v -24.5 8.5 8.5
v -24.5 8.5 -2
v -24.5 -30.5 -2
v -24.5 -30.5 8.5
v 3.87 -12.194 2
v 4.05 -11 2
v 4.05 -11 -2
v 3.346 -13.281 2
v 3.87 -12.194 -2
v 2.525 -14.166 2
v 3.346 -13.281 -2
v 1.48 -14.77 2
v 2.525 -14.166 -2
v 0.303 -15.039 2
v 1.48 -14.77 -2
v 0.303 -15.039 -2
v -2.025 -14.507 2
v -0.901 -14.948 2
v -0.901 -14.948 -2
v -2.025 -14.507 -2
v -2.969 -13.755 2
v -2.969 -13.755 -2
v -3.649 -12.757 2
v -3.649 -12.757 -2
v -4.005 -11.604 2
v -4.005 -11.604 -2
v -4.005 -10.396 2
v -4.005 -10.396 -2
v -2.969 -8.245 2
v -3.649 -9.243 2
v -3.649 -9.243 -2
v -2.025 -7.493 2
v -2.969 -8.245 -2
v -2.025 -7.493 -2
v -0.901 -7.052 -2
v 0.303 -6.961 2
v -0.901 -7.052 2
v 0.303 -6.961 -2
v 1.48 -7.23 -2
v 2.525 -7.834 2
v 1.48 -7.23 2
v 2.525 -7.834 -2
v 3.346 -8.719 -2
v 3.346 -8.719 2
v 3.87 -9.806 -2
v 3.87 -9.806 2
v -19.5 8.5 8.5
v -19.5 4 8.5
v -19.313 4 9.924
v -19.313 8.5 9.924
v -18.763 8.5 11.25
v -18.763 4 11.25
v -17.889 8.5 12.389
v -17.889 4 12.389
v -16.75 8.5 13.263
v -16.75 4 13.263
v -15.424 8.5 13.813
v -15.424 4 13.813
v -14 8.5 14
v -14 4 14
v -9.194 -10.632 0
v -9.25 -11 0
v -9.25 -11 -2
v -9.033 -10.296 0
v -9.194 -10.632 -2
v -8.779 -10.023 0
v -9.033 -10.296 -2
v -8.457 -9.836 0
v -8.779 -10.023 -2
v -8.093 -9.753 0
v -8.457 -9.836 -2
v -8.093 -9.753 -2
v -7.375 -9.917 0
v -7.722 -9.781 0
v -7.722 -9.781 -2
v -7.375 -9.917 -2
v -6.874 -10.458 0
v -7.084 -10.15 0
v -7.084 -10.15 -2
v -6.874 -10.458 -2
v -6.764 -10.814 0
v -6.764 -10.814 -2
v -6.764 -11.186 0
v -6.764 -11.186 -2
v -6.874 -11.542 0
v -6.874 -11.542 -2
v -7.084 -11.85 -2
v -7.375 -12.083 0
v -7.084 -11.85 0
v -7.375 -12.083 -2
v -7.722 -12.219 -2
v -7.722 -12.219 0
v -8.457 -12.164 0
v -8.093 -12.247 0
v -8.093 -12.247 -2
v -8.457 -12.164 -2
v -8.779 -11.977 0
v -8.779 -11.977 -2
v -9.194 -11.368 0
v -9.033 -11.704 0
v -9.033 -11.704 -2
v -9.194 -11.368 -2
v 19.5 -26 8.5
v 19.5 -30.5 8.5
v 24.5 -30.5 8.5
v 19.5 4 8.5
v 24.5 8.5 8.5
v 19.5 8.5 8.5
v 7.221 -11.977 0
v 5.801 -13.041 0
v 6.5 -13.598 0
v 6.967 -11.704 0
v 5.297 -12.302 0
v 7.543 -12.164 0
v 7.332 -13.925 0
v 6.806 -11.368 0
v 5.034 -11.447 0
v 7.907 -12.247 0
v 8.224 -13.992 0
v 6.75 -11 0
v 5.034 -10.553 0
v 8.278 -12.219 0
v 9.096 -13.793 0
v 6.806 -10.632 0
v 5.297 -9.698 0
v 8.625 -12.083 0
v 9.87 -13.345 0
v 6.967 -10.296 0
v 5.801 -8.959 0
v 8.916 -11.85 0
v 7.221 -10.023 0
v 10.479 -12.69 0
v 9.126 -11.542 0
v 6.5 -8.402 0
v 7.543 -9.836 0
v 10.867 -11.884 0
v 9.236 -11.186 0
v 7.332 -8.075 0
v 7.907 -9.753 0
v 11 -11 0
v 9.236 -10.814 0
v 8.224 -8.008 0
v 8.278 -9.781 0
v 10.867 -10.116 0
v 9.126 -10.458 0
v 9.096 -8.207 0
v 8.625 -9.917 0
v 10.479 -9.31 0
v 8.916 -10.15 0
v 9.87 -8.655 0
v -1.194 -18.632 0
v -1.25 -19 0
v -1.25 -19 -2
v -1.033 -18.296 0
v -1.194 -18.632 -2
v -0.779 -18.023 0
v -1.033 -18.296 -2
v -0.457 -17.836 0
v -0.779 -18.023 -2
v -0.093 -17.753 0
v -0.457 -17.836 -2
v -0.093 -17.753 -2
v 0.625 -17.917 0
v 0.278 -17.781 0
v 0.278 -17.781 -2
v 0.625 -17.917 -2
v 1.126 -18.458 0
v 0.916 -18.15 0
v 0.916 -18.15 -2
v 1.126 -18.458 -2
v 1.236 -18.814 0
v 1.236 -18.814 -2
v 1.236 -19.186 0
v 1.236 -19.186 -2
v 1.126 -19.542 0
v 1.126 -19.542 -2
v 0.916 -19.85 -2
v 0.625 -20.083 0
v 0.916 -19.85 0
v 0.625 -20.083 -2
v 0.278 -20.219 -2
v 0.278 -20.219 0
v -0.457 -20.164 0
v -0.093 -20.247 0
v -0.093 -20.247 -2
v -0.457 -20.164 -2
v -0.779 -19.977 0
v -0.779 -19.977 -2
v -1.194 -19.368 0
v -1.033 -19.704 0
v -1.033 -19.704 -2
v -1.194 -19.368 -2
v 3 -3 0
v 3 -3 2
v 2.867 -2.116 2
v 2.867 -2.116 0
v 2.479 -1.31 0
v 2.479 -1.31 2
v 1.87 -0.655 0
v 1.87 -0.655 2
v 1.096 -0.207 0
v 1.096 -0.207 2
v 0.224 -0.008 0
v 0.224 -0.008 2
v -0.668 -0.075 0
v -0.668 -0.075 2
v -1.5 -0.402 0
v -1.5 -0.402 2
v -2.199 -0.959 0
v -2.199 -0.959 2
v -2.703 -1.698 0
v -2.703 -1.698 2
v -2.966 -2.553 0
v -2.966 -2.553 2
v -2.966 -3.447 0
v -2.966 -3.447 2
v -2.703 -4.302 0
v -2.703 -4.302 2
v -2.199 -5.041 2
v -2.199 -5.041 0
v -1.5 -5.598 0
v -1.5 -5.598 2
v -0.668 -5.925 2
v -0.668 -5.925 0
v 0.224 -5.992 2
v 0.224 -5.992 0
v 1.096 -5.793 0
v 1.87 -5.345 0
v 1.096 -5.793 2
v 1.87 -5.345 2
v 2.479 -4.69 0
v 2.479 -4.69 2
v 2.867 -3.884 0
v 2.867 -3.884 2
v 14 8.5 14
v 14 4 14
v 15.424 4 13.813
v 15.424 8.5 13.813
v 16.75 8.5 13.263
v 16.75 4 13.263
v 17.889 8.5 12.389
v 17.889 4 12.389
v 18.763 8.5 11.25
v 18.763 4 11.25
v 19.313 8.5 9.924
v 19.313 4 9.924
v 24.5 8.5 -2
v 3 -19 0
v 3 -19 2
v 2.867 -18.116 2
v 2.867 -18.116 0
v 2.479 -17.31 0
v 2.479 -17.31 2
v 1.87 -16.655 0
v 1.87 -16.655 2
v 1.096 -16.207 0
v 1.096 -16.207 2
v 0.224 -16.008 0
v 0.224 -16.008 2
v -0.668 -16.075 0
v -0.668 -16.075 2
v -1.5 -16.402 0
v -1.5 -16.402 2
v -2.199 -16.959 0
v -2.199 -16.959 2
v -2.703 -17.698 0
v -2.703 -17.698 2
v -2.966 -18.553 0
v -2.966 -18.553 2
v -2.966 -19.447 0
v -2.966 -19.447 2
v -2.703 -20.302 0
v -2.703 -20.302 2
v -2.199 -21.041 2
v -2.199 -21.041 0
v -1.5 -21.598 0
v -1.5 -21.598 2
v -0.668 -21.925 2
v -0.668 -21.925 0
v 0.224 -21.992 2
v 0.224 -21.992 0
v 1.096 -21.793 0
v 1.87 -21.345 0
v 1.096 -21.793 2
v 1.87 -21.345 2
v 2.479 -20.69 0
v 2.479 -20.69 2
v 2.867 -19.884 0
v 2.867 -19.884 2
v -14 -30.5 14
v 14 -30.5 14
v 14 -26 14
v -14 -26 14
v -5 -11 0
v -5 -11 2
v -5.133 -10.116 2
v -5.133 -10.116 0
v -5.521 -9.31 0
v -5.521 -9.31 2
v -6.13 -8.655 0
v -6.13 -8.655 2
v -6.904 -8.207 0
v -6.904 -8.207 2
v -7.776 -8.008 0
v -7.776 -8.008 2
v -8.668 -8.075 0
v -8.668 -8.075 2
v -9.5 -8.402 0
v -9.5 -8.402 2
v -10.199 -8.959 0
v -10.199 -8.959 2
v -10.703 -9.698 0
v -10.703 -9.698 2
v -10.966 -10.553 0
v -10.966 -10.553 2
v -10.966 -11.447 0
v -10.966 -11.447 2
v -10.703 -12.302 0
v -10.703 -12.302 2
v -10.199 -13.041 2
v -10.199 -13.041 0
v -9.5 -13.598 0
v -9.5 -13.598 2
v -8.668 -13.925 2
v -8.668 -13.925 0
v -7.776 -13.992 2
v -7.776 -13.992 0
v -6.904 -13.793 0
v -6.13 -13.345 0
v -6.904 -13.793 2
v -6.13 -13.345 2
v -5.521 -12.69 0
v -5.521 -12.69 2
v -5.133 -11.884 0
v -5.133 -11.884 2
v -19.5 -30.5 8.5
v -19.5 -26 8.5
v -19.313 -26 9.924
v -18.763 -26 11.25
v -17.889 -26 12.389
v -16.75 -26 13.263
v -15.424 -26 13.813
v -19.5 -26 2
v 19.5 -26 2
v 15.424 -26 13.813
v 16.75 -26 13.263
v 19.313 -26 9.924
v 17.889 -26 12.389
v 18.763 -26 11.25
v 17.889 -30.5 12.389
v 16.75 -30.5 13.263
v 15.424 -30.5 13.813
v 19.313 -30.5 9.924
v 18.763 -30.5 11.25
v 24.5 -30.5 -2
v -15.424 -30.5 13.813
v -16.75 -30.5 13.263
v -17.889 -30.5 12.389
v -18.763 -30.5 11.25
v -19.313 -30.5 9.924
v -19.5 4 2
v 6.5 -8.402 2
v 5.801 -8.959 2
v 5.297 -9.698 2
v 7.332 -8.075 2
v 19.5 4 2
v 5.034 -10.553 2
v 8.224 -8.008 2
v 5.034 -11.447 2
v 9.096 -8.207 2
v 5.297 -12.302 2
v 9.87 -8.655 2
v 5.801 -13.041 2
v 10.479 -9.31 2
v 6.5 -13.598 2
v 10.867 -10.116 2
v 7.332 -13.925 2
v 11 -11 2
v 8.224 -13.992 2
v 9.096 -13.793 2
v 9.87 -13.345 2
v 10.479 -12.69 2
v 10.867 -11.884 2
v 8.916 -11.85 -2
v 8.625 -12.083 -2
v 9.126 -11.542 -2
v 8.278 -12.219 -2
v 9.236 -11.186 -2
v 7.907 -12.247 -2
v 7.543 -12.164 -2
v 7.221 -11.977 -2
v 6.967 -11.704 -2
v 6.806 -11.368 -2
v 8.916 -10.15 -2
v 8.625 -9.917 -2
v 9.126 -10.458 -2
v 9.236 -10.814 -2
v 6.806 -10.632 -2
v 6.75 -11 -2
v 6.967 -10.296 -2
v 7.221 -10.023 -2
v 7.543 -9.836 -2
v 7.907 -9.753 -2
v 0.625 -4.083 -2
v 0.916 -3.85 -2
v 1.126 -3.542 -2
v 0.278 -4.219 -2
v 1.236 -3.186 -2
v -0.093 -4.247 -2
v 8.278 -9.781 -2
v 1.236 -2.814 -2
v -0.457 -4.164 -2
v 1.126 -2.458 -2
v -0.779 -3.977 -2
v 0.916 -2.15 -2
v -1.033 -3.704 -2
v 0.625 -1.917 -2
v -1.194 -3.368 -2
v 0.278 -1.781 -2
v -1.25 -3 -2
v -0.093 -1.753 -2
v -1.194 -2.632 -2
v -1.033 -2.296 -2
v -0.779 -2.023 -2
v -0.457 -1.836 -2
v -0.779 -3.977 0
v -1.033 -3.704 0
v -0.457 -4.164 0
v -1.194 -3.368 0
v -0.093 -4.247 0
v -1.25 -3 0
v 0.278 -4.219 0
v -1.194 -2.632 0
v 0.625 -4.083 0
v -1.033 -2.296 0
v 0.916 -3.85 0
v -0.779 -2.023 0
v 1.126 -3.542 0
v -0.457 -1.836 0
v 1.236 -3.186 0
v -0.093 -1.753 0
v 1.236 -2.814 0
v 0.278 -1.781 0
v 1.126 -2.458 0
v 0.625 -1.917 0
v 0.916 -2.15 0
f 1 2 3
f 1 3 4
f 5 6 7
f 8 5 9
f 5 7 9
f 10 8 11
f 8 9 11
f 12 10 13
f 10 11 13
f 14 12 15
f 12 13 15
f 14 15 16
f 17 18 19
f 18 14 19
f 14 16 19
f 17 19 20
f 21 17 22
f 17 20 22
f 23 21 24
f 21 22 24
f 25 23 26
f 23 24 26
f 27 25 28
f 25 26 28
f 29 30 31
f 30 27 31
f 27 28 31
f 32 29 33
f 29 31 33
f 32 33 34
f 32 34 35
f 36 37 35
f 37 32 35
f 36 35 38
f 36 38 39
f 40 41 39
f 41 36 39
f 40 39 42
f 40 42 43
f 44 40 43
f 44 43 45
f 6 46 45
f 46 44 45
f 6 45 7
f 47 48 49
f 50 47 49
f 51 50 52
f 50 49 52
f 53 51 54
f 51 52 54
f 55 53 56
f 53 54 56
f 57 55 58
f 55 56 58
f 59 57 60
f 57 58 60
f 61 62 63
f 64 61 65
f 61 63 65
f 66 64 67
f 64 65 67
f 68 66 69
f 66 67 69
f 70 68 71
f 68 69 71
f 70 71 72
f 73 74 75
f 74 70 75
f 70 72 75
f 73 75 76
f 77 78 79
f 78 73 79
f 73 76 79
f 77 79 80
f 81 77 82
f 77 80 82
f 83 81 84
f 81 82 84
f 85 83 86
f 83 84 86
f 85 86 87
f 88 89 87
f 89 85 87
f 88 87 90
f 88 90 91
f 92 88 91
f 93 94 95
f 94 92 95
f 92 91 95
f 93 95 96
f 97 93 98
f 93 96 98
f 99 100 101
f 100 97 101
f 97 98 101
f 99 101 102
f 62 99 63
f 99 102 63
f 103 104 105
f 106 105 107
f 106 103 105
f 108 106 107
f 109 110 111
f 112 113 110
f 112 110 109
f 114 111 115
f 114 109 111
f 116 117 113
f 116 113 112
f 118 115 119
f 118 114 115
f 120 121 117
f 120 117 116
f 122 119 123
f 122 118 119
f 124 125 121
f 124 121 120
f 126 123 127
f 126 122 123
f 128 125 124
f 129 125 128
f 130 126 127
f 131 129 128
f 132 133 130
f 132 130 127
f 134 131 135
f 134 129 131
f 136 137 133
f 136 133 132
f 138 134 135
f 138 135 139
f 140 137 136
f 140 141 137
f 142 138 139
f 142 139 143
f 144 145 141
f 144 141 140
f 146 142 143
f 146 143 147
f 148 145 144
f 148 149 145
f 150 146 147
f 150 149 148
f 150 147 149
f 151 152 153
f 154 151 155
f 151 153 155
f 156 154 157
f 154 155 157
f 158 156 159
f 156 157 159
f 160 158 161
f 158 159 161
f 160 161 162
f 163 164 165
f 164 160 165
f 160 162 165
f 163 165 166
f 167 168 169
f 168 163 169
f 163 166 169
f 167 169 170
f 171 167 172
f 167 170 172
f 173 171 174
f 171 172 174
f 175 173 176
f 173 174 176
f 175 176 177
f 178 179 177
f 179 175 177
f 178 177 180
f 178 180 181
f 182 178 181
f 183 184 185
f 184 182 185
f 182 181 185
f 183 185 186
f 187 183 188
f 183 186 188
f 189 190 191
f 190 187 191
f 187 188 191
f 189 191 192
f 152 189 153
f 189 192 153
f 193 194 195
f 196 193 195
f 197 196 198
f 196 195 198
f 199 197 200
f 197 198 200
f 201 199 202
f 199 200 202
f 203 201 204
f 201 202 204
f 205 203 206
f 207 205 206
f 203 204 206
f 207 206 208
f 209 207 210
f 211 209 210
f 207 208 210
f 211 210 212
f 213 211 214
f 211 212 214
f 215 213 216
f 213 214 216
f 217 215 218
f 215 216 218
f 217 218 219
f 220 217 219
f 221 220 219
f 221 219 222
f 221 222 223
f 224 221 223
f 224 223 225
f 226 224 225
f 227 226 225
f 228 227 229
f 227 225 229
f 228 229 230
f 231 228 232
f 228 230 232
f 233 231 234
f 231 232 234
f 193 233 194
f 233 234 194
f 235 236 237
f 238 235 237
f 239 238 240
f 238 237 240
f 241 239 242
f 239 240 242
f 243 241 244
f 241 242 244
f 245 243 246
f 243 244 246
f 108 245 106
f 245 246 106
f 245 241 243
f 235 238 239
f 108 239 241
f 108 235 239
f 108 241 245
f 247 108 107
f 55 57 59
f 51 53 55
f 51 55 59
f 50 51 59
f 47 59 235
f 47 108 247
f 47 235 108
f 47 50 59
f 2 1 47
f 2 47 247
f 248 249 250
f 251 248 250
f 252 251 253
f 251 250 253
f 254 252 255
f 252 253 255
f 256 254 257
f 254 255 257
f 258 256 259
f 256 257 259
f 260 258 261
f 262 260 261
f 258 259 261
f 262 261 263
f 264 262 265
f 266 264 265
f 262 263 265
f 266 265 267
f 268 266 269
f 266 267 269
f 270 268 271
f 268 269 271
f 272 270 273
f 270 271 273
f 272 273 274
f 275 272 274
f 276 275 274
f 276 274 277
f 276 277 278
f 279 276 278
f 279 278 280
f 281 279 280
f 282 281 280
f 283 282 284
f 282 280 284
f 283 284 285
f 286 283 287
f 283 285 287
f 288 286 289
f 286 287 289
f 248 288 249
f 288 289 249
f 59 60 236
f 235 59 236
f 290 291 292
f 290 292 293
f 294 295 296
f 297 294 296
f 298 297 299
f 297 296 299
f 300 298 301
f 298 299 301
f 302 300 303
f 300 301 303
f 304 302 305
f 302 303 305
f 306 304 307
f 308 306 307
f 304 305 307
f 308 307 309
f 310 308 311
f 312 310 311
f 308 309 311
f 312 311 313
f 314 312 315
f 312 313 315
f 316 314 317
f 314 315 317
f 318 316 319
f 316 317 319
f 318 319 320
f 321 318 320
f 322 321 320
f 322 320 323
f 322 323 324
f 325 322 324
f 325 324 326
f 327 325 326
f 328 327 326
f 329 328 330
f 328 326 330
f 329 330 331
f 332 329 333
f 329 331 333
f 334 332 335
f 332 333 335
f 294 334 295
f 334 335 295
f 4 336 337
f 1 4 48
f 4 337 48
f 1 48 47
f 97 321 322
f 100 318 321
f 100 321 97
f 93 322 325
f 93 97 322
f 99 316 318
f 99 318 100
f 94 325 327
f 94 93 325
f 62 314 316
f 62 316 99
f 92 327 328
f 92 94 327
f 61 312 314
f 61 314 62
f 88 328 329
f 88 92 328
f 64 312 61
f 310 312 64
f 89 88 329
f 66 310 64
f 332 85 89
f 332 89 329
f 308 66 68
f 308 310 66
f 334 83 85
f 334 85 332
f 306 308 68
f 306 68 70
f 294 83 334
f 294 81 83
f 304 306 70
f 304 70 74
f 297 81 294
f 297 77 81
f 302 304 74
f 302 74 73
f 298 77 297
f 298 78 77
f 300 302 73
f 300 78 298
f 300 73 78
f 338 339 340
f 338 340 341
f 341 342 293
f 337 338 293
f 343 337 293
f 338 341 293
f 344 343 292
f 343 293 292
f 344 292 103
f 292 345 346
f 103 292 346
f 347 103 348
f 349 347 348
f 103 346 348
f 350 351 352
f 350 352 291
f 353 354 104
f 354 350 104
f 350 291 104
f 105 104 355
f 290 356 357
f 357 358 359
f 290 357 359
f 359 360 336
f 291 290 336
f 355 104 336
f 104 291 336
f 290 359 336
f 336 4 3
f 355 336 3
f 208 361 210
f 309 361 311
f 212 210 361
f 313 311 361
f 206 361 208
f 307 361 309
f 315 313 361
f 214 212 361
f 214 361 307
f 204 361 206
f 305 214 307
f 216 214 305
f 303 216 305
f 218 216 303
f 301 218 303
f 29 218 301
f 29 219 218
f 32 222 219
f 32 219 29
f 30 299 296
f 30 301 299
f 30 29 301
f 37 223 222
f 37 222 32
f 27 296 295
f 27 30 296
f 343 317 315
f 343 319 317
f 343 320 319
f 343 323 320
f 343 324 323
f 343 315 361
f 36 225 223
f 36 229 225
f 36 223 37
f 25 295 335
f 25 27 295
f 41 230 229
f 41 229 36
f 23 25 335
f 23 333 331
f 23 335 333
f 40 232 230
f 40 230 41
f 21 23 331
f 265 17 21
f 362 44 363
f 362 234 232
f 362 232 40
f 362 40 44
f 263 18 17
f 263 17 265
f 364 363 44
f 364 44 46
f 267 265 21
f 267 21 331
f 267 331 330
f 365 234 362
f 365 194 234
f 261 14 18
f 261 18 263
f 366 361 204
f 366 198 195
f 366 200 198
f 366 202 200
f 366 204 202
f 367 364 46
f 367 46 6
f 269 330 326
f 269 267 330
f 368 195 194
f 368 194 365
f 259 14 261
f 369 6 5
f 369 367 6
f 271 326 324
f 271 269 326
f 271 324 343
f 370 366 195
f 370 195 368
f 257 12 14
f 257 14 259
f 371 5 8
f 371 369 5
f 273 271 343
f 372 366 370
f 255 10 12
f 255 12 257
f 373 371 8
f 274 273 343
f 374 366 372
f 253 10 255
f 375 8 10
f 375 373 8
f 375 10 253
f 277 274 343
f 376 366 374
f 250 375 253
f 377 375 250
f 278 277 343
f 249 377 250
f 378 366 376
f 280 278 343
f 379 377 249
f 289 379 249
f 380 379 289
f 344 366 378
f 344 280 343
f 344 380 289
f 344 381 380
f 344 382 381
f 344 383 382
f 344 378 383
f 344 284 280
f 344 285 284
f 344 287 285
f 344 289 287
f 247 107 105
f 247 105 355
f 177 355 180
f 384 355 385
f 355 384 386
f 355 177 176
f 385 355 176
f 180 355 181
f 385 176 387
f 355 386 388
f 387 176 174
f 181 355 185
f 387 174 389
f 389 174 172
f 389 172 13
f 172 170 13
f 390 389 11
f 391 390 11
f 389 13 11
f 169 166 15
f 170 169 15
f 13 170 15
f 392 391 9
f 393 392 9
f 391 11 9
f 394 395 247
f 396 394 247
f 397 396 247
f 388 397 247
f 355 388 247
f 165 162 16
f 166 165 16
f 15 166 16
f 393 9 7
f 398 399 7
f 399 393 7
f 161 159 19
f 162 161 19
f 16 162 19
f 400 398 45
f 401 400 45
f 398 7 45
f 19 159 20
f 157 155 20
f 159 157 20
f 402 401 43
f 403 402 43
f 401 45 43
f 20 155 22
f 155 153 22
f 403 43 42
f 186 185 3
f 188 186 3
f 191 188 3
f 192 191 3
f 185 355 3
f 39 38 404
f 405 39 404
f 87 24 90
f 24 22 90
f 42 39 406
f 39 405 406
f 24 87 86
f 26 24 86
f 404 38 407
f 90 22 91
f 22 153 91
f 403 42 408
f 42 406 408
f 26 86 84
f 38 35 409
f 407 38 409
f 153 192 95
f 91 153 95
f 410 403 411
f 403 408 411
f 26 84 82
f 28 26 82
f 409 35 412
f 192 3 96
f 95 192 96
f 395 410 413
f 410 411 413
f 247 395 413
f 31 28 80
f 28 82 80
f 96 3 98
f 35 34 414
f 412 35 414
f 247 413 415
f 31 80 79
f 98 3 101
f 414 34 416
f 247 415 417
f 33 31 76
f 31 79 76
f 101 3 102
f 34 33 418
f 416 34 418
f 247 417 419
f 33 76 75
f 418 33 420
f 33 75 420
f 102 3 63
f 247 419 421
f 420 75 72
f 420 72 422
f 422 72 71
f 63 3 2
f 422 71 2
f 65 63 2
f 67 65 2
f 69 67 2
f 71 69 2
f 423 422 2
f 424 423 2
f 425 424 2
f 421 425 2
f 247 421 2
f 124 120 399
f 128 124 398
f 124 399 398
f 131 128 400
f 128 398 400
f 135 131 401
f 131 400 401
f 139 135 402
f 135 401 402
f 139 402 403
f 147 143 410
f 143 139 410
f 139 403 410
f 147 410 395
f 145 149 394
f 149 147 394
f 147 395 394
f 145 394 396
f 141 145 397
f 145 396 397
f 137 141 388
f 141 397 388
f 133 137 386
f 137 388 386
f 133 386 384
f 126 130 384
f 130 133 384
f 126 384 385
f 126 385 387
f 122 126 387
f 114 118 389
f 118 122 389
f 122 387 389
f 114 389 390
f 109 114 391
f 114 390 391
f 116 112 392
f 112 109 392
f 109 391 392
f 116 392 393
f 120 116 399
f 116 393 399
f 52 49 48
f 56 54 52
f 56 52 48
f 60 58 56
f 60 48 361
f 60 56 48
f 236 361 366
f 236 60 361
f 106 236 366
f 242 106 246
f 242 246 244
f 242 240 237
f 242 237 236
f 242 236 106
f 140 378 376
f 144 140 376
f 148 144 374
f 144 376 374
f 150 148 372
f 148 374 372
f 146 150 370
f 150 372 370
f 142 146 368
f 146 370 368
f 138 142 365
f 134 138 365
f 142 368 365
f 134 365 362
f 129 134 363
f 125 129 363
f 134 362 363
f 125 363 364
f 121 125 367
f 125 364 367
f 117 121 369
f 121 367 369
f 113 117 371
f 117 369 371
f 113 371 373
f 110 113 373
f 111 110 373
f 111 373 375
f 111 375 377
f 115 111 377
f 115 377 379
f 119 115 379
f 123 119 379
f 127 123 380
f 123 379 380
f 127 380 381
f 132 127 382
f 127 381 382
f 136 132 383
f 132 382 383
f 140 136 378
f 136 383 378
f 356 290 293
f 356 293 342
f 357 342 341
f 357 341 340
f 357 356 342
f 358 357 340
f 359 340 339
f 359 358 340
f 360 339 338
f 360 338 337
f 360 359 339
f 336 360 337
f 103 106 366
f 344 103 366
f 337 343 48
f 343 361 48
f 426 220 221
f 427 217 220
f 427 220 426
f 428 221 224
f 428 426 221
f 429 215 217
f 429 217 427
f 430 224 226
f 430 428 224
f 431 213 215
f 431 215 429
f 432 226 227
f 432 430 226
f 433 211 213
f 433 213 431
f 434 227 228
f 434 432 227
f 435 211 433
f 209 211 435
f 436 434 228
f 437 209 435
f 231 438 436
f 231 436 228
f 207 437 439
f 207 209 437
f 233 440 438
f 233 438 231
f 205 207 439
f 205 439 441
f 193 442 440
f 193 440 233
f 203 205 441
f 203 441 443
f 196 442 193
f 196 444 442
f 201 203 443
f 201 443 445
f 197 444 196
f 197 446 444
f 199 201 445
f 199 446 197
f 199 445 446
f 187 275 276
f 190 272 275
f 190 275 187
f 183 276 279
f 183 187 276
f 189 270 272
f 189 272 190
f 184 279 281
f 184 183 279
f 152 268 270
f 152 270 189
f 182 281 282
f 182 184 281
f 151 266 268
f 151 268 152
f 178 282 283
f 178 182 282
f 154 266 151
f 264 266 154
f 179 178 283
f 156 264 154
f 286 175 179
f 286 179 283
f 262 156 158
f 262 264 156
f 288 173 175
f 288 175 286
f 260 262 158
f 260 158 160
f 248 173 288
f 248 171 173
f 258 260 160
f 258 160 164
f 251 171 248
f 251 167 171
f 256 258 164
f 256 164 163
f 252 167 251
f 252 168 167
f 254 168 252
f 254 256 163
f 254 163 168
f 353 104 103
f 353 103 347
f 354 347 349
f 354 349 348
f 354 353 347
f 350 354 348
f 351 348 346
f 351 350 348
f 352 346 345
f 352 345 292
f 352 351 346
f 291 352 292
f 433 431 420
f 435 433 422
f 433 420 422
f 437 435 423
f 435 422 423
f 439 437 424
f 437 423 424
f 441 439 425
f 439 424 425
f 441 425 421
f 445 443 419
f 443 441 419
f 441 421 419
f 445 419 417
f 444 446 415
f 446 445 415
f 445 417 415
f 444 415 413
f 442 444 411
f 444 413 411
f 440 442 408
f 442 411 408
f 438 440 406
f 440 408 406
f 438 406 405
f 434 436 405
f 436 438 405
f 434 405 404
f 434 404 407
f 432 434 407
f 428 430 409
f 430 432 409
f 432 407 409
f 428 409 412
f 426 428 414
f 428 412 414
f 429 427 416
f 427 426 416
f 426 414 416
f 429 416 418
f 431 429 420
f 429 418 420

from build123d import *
from build123d.topology import SkipClean

# Parameters (mm, degrees)
SKETCH1_W            = 39
SKETCH1_H            = 23.712741858
BOSS_EXTRUDE1_DEPTH  = 2
SKETCH9_R            = 4.05
CUT_EXTRUDE6_DEPTH   = 5
SKETCH10_R           = 1.25
BOSS_EXTRUDE5_DEPTH  = 5.5
SKETCH11_R           = 2.5
CUT_EXTRUDE7_DEPTH   = 5
BOSS_EXTRUDE6_START  = -5.5
SKETCH12_R           = 2.5
BOSS_EXTRUDE6_DEPTH  = 5.5
BOSS_EXTRUDE7_DEPTH  = 28
BOSS_EXTRUDE8_START  = 2
SKETCH14_W           = 39
SKETCH14_H           = 29
SKETCH14_R           = 1.25
SKETCH14_R_2         = 4.05
BOSS_EXTRUDE8_DEPTH  = 2
SKETCH15_R           = 3
CUT_EXTRUDE8_DEPTH   = 2
BOSS_EXTRUDE9_DEPTH  = 5
BOSS_EXTRUDE10_START = 5
BOSS_EXTRUDE10_DEPTH = 5
CUT_EXTRUDE9_REACH   = 41.579
SKETCH18_W           = 39
SKETCH18_H           = 30
SKETCH19_W           = 10.5
SKETCH19_H           = 39
BOSS_EXTRUDE11_DEPTH = 5
SKETCH20_W           = 10.5
SKETCH20_H           = 39
BOSS_EXTRUDE12_DEPTH = 5


with BuildPart() as part:
    # Sketch1 → Boss-Extrude1 (new body)
    with BuildSketch(Plane.XY):
        with Locations((0, -11)):
            Rectangle(SKETCH1_W, SKETCH1_H)
        with BuildLine():
            ThreePointArc((1.25, -19), (0, -17.75), (-1.25, -19))
            ThreePointArc((-1.25, -19), (0, -20.25), (1.25, -19))
        make_face(mode=Mode.SUBTRACT)
        with BuildLine():
            ThreePointArc((-6.75, -11), (-8, -9.75), (-9.25, -11))
            ThreePointArc((-9.25, -11), (-8, -12.25), (-6.75, -11))
        make_face(mode=Mode.SUBTRACT)
        with BuildLine():
            ThreePointArc((1.25, -3), (0, -1.75), (-1.25, -3))
            ThreePointArc((-1.25, -3), (0, -4.25), (1.25, -3))
        make_face(mode=Mode.SUBTRACT)
        with BuildLine():
            ThreePointArc((9.25, -11), (8, -9.75), (6.75, -11))
            ThreePointArc((6.75, -11), (8, -12.25), (9.25, -11))
        make_face(mode=Mode.SUBTRACT)
    extrude(amount=BOSS_EXTRUDE1_DEPTH)

    # Sketch9 → Cut-Extrude6 (cut)
    with BuildSketch(Plane.XY.offset(2)):
        with Locations((0, -11)):
            Circle(SKETCH9_R)
    extrude(amount=-CUT_EXTRUDE6_DEPTH, mode=Mode.SUBTRACT)

    # Sketch10 → Boss-Extrude5 (add)
    # profile 1 of 2: a face of its own
    with BuildSketch(Plane.ZY.offset(19.5)):
        with BuildLine():
            Line((4.2, 3.5), (8.5, 3.5))
            Line((8.5, 3.5), (8.5, 0.5))
            ThreePointArc((8.5, 0.5), (7.474873734, -1.974873734), (5, -3))
            Line((5, -3), (2, -3))
            Line((2, -3), (2, 0.856370929))
            Line((2, 0.856370929), (0, 0.856370929))
            Line((0, 0.856370929), (0, 3.5))
            Line((0, 3.5), (4.2, 3.5))
        make_face()
        with Locations((5.25, 0.25)):
            Circle(SKETCH10_R, mode=Mode.SUBTRACT)
    # profile 2 of 2: a face of its own
    with BuildSketch(Plane.ZY.offset(19.5)):
        with BuildLine():
            Line((5, -19), (2, -19))
            Line((2, -19), (2, -22.856370929))
            Line((2, -22.856370929), (0, -22.856370929))
            Line((0, -22.856370929), (0, -25.5))
            Line((0, -25.5), (4.2, -25.5))
            Line((4.2, -25.5), (8.5, -25.5))
            Line((8.5, -25.5), (8.5, -22.5))
            ThreePointArc((8.5, -22.5), (7.474873734, -20.025126266), (5, -19))
        make_face()
        with Locations((5.25, -22.25)):
            Circle(SKETCH10_R, mode=Mode.SUBTRACT)
    extrude(amount=-BOSS_EXTRUDE5_DEPTH)

    # Sketch11 → Cut-Extrude7 (cut)
    with BuildSketch(Plane.ZY.offset(19.5)):
        with Locations((5.25, 0.25)):
            Circle(SKETCH11_R)
        with Locations(Location((5.25, -22.25, 0), (0, 0, 180))):
            Circle(SKETCH11_R)
    extrude(amount=-CUT_EXTRUDE7_DEPTH, mode=Mode.SUBTRACT)

    # Sketch12 → Boss-Extrude6 (add)
    with BuildSketch(Plane(origin=(19.5, 0, 0), x_dir=(0, 0, -1), z_dir=(1, 0, 0)).offset(BOSS_EXTRUDE6_START)):
        with BuildLine():
            ThreePointArc((-8.5, 0.5), (-7.474873734, -1.974873734), (-5, -3))
            Line((-5, -3), (-2, -3))
            Line((-2, -3), (-2, -19))
            Line((-2, -19), (-5, -19))
            ThreePointArc((-5, -19), (-7.474873734, -20.025126266), (-8.5, -22.5))
            Line((-8.5, -22.5), (-8.5, -25.5))
            Line((-8.5, -25.5), (0, -25.5))
            Line((0, -25.5), (0, 3.5))
            Line((0, 3.5), (-8.5, 3.5))
            Line((-8.5, 3.5), (-8.5, 0.5))
        make_face()
        with Locations((-5.25, -22.25)):
            Circle(SKETCH12_R, mode=Mode.SUBTRACT)
        with Locations(Location((-5.25, 0.25, 0), (0, 0, 180))):
            Circle(SKETCH12_R, mode=Mode.SUBTRACT)
    extrude(amount=BOSS_EXTRUDE6_DEPTH)

    # Sketch13 → Boss-Extrude7 (add)
    with BuildSketch(Plane.ZY.offset(-14)):
        Polygon((0, 3.5), (4.2, 3.5), (2, 1.3), (2, 0.856370929), (0, 0.856370929), align=None)
        Polygon((2, -22.856370929), (0, -22.856370929), (0, -25.5), (4.2, -25.5), (2, -23.3), align=None)
    extrude(amount=BOSS_EXTRUDE7_DEPTH)

    # Sketch14 → Boss-Extrude8 (add)
    with SkipClean():  # the faces are left unmerged after this step: merging them gives an invalid solid
        with BuildSketch(Plane(origin=(0, 0, 0), x_dir=(-1, 0, 0), z_dir=(0, 0, -1)).offset(BOSS_EXTRUDE8_START)):
            with Locations((0, -11)):
                Rectangle(SKETCH14_W, SKETCH14_H)
            with Locations((0, -19)):
                Circle(SKETCH14_R, mode=Mode.SUBTRACT)
            with Locations((8, -11)):
                Circle(SKETCH14_R, mode=Mode.SUBTRACT)
            with Locations((0, -3)):
                Circle(SKETCH14_R, mode=Mode.SUBTRACT)
            with Locations(Location((0, -11, 0), (0, 0, 180))):
                Circle(SKETCH14_R_2, mode=Mode.SUBTRACT)
            with Locations((-8, -11)):
                Circle(SKETCH14_R, mode=Mode.SUBTRACT)
        extrude(amount=-BOSS_EXTRUDE8_DEPTH)

    # Sketch15 → Cut-Extrude8 (cut)
    with BuildSketch(Plane.XY.offset(2)):
        with Locations((0, -3)):
            Circle(SKETCH15_R)
        with Locations((8, -11)):
            Circle(SKETCH15_R)
        with Locations((0, -19)):
            Circle(SKETCH15_R)
        with Locations((-8, -11)):
            Circle(SKETCH15_R)
    extrude(amount=-CUT_EXTRUDE8_DEPTH, mode=Mode.SUBTRACT)

    # Sketch16 → Boss-Extrude9 (add)
    with BuildSketch(Plane(origin=(0, 3.5, 0), x_dir=(1, 0, 0), z_dir=(0, 1, 0))):
        with BuildLine():
            ThreePointArc((-19.5, -8.5), (-17.889087297, -12.389087297), (-14, -14))
            Line((-14, -14), (14, -14))
            ThreePointArc((14, -14), (17.889087297, -12.389087297), (19.5, -8.5))
            Line((19.5, -8.5), (14, -8.5))
            Line((14, -8.5), (14, -4.2))
            Line((14, -4.2), (-14, -4.2))
            Line((-14, -4.2), (-14, -8.5))
            Line((-14, -8.5), (-19.5, -8.5))
        make_face()
        Polygon((-19.5, -8.5), (-14, -8.5), (-14, -4.2), (14, -4.2), (14, -8.5), (19.5, -8.5), (19.5, 2), (-19.5, 2), align=None)
    extrude(amount=BOSS_EXTRUDE9_DEPTH)

    # Sketch17 → Boss-Extrude10 (add)
    with BuildSketch(Plane.XZ.offset(25.5).offset(BOSS_EXTRUDE10_START)):
        with BuildLine():
            Line((19.5, -2), (19.5, 8.5))
            ThreePointArc((19.5, 8.5), (17.889087297, 12.389087297), (14, 14))
            Line((14, 14), (-14, 14))
            ThreePointArc((-14, 14), (-17.889087297, 12.389087297), (-19.5, 8.5))
            Line((-19.5, 8.5), (-19.5, -2))
            Line((-19.5, -2), (19.5, -2))
        make_face()
    extrude(amount=-BOSS_EXTRUDE10_DEPTH)

    # Cut-Extrude9: up to this face of the body (flat: up to its plane)
    cut_extrude9_end = Plane(part.part.faces().sort_by_distance((16.75, -3.461103025, 2))[0])
    # Sketch18 → Cut-Extrude9 (cut, up to the picked face)
    with BuildSketch(Plane.XY.offset(14), mode=Mode.PRIVATE) as cut_extrude9_sk1:
        with Locations((0, -11)):
            Rectangle(SKETCH18_W, SKETCH18_H)
    cut_extrude9_tool1 = split(extrude(cut_extrude9_sk1.sketch, amount=-CUT_EXTRUDE9_REACH, mode=Mode.PRIVATE), bisect_by=cut_extrude9_end, keep=Keep.BOTH, mode=Mode.PRIVATE)
    add(cut_extrude9_tool1.solids().sort_by(Axis((0, -11, 14), (0, 0, -1)))[0], mode=Mode.SUBTRACT)

    # Sketch19 → Boss-Extrude11 (add)
    with BuildSketch(Plane.ZY.offset(19.5)):
        with Locations((3.25, -11)):
            Rectangle(SKETCH19_W, SKETCH19_H)
    extrude(amount=BOSS_EXTRUDE11_DEPTH)

    # Sketch20 → Boss-Extrude12 (add)
    with BuildSketch(Plane(origin=(19.5, 0, 0), x_dir=(0, 0, -1), z_dir=(1, 0, 0))):
        with Locations((-3.25, -11)):
            Rectangle(SKETCH20_W, SKETCH20_H)
    extrude(amount=BOSS_EXTRUDE12_DEPTH)


solid = part.part
